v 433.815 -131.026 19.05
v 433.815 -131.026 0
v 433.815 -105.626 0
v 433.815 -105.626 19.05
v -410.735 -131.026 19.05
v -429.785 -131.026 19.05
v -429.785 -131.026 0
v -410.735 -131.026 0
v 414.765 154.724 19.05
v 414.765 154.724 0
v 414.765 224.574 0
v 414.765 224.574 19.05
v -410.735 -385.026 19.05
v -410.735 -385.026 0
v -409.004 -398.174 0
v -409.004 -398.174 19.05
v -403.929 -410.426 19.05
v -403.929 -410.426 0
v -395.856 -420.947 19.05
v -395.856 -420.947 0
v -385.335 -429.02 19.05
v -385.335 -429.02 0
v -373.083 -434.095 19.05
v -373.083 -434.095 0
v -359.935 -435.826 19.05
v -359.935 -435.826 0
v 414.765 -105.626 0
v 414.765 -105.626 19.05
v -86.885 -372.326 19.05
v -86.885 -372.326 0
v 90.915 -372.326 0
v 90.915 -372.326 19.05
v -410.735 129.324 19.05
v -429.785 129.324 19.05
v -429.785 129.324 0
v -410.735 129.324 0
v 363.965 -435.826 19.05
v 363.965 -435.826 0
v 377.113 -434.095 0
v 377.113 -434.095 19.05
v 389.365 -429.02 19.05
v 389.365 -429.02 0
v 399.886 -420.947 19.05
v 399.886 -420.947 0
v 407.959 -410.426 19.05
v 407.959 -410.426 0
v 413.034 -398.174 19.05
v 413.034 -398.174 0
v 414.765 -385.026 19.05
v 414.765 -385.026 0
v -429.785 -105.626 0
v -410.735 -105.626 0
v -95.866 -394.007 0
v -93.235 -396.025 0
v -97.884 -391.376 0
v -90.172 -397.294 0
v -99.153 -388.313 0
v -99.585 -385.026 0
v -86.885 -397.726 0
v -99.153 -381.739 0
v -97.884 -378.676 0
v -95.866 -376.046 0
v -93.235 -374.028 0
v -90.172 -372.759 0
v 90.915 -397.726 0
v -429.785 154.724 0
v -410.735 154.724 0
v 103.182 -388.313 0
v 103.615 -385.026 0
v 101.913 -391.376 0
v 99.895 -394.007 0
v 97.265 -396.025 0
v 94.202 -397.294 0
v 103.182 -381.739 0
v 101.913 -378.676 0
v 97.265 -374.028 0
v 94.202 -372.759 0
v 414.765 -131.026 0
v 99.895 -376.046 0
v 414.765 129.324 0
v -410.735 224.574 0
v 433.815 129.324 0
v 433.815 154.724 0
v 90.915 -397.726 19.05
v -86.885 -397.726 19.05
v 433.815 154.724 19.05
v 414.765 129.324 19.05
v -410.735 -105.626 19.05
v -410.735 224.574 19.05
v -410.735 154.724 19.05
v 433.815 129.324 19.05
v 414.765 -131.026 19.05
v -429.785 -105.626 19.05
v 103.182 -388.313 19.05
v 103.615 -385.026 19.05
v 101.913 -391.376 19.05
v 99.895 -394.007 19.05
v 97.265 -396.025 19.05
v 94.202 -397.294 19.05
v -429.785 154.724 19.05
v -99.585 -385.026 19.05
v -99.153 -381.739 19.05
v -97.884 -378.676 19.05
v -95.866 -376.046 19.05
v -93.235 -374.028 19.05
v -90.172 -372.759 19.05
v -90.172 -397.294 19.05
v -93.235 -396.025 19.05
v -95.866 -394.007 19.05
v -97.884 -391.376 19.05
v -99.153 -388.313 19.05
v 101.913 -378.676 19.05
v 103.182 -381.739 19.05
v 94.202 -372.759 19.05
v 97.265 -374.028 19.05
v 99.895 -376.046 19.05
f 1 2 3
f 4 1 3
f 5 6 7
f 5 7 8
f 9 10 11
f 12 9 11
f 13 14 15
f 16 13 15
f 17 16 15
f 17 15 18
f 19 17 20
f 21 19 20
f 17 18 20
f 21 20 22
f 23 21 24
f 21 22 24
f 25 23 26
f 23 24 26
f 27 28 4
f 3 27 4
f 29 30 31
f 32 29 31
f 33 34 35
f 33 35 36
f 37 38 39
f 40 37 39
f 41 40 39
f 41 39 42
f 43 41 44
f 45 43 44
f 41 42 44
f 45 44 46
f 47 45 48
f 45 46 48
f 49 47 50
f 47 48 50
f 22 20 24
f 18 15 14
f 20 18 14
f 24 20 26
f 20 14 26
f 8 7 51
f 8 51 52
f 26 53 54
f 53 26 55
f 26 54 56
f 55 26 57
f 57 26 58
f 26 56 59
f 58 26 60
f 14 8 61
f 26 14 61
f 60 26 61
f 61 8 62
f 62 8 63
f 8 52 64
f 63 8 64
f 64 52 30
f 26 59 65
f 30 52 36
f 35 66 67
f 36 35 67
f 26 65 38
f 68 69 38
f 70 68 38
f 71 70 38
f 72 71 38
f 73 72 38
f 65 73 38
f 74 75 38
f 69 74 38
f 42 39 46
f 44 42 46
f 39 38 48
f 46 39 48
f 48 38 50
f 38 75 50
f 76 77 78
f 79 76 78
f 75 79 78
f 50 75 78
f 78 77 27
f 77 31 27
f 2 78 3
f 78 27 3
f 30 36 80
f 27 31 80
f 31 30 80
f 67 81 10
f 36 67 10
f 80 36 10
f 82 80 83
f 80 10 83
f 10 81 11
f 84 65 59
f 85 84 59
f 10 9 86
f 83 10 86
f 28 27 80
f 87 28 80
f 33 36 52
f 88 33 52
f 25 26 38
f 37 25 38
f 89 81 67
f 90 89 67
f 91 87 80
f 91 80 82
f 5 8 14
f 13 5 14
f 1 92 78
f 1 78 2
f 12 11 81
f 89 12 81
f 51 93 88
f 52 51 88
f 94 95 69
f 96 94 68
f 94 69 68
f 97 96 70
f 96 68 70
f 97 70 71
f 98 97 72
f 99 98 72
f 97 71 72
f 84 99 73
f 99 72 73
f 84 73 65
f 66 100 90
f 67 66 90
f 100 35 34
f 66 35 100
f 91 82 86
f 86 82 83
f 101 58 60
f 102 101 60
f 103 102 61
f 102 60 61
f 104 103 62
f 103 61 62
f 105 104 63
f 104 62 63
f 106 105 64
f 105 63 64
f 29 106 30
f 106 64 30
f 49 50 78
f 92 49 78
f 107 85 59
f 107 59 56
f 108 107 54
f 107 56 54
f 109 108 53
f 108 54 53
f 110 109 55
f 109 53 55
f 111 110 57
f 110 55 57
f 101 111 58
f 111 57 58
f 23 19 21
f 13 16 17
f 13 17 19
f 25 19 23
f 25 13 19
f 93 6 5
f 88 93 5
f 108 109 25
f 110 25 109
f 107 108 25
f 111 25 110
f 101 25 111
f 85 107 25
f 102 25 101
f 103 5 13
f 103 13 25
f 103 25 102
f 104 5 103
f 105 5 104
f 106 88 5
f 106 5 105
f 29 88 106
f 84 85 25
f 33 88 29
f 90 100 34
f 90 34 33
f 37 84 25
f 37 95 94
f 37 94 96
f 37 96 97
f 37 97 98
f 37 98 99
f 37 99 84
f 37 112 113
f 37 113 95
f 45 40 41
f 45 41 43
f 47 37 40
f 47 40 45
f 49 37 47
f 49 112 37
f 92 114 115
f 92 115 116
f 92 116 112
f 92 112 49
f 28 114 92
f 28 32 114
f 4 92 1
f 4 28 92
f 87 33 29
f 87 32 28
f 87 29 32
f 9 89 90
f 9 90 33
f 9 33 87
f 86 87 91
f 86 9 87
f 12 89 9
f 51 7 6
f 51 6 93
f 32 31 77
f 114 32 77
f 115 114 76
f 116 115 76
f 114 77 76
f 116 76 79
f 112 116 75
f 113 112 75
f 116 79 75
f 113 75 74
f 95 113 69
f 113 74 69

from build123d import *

# Parameters (mm, degrees)
F0_W     = 19.05
F0_H     = 25.4
F1_DEPTH = 19.05


with BuildPart() as f1:
    # F0 (on Top) → F1 (new body)
    with BuildSketch(Plane.XY):
        with BuildLine():
            Line((414.764641, 224.573665), (-410.735359, 224.573665))
            Line((-410.735359, 224.573665), (-410.735359, 154.723665))
            Line((-410.735359, 154.723665), (-410.735359, 129.323665))
            Line((-410.735359, 129.323665), (-410.735359, -105.626335))
            Line((-410.735359, -105.626335), (-410.735359, -131.026335))
            Line((-410.735359, -131.026335), (-410.735359, -385.026335))
            ThreePointArc((-410.735359, -385.026335), (-395.856384, -420.94736), (-359.935359, -435.826335))
            Line((-359.935359, -435.826335), (363.964641, -435.826335))
            ThreePointArc((363.964641, -435.826335), (399.885665, -420.94736), (414.764641, -385.026335))
            Line((414.764641, -385.026335), (414.764641, -131.026335))
            Line((414.764641, -131.026335), (414.764641, -105.626335))
            Line((414.764641, -105.626335), (414.764641, 129.323665))
            Line((414.764641, 129.323665), (414.764641, 154.723665))
            Line((414.764641, 154.723665), (414.764641, 224.573665))
        make_face()
        with BuildLine():
            Line((90.914641, -397.726335), (-86.885359, -397.726335))
            ThreePointArc((-86.885359, -397.726335), (-95.865615, -394.006591), (-99.585359, -385.026335))
            ThreePointArc((-99.585359, -385.026335), (-95.865615, -376.046079), (-86.885359, -372.326335))
            Line((-86.885359, -372.326335), (90.914641, -372.326335))
            ThreePointArc((90.914641, -372.326335), (99.894897, -376.046079), (103.614641, -385.026335))
            ThreePointArc((103.614641, -385.026335), (99.894897, -394.006591), (90.914641, -397.726335))
        make_face(mode=Mode.SUBTRACT)
        with Locations((-420.260359, 142.023665)):
            Rectangle(F0_W, F0_H)
        with Locations((424.289641, 142.023665)):
            Rectangle(F0_W, F0_H)
        with Locations((-420.260359, -118.326335)):
            Rectangle(F0_W, F0_H)
        with Locations((424.289641, -118.326335)):
            Rectangle(F0_W, F0_H)
    extrude(amount=F1_DEPTH)


solid = f1.part
